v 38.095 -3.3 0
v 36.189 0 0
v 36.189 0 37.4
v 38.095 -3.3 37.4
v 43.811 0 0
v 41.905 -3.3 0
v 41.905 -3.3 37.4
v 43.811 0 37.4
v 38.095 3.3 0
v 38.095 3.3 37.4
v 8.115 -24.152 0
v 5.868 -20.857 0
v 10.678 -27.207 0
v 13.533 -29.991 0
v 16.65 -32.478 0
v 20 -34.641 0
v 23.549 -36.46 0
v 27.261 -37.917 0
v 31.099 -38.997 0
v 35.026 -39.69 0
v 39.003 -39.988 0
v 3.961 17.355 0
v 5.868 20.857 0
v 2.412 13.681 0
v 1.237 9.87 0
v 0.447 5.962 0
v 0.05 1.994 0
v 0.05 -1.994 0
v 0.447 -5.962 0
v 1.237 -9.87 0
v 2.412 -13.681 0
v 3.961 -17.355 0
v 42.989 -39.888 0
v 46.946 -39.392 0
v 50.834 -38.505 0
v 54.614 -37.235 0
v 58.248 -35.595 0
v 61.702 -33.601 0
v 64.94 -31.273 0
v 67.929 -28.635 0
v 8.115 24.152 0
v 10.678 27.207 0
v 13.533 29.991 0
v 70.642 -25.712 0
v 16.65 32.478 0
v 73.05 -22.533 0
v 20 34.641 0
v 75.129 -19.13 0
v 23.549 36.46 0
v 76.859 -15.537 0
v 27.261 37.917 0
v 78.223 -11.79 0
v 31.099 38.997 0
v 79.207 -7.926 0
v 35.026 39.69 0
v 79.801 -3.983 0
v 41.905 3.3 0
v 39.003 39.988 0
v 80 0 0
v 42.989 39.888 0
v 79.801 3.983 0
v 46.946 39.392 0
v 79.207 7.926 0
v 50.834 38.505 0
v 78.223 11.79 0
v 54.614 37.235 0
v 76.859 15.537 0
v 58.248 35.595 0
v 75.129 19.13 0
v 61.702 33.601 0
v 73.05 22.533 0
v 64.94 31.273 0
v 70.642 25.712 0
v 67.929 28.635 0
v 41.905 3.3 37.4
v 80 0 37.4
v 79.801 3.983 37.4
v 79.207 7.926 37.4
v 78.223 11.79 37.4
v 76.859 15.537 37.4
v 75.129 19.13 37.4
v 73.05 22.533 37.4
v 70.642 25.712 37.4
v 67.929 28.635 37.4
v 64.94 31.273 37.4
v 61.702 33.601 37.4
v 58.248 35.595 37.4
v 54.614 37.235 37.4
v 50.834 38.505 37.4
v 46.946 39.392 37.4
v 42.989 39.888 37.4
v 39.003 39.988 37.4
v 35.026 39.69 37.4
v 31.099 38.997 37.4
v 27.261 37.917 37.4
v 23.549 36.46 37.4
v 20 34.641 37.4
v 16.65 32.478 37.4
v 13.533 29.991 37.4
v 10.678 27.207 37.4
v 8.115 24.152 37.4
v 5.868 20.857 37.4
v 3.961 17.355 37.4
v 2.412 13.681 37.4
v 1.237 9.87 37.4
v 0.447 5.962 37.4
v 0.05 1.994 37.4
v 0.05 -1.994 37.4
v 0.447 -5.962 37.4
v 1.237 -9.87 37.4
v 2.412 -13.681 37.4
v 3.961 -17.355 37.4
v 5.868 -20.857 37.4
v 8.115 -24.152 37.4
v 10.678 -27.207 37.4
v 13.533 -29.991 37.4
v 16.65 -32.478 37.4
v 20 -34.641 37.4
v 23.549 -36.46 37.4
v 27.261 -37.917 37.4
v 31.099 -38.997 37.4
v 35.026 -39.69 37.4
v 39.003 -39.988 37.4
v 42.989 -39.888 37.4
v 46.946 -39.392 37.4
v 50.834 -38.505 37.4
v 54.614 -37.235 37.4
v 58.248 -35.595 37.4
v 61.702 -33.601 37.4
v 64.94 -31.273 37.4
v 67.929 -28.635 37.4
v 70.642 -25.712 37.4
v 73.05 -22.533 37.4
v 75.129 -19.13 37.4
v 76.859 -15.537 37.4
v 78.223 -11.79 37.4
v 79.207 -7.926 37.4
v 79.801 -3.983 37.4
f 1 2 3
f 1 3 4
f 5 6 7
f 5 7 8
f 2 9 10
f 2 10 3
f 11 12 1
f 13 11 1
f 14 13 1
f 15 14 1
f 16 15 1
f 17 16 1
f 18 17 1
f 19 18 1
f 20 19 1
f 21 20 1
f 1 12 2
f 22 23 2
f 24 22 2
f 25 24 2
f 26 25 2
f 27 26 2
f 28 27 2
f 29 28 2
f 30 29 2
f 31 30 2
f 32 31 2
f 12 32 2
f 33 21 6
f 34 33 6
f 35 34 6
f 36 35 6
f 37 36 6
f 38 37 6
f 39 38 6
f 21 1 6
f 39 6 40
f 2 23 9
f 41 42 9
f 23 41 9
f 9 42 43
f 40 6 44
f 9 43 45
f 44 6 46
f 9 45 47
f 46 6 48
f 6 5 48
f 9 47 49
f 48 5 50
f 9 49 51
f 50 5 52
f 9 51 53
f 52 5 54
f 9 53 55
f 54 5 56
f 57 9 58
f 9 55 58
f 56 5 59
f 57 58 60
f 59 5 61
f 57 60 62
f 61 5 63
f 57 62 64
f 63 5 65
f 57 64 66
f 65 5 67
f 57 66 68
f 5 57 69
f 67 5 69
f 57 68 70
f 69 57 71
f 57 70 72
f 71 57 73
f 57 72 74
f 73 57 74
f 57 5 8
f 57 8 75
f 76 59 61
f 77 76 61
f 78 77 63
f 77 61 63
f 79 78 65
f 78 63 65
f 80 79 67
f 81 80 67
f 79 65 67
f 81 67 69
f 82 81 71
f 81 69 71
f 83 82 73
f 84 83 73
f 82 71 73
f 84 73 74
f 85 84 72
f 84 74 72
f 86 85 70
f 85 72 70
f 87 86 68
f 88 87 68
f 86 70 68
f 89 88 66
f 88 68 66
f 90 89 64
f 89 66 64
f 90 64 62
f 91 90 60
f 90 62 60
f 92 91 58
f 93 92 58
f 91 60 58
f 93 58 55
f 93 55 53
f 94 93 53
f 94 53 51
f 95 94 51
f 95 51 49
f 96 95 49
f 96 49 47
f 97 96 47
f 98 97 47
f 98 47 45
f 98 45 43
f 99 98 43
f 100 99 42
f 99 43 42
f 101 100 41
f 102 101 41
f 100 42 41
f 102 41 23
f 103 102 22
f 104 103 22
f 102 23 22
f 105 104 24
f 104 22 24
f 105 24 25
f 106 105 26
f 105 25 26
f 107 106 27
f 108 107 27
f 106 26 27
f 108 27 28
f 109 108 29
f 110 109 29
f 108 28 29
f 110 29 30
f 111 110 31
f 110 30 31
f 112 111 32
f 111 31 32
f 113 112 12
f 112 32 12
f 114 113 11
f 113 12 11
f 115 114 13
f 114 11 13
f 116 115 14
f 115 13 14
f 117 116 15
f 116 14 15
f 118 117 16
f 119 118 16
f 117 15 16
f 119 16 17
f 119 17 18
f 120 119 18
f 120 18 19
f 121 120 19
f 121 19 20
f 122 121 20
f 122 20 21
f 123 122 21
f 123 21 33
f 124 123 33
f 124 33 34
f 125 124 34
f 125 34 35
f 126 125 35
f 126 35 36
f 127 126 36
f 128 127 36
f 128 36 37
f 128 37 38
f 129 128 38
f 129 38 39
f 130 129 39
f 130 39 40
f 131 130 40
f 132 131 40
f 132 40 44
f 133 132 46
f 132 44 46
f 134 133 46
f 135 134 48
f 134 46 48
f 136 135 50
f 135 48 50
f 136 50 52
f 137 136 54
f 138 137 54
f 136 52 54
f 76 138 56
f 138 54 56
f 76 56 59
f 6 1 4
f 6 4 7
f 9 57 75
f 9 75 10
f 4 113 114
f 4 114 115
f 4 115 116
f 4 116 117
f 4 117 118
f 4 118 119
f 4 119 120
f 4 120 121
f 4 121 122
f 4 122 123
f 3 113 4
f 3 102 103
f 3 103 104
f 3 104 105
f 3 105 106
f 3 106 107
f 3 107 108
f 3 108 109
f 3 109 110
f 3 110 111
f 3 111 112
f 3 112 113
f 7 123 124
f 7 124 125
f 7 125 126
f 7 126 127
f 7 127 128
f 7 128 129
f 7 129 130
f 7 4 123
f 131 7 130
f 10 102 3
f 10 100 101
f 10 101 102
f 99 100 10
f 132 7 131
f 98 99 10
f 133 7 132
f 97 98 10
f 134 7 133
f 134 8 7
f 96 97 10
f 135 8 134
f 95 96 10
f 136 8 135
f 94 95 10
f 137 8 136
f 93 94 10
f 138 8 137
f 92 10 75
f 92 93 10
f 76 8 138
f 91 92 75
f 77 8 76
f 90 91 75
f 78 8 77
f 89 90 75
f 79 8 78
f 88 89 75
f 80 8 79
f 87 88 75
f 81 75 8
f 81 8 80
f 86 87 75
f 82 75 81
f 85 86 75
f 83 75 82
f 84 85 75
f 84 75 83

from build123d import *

# Parameters (mm, degrees)
SKETCH_R     = 40
PAD_DEPTH    = 37.4
POCKET_DEPTH = 37.401


with BuildPart() as part:
    # Sketch → Pad (new body)
    with BuildSketch(Plane.XY):
        with Locations((40, 0)):
            Circle(SKETCH_R)
    extrude(amount=PAD_DEPTH)

    # Sketch001 → Pocket (cut, through all)
    with BuildSketch(Plane.XY):
        Polygon((43.810512, 0), (41.905256, 3.3), (38.094744, 3.3), (36.189488, 0), (38.094744, -3.3), (41.905256, -3.3), align=None)
    extrude(amount=POCKET_DEPTH, mode=Mode.SUBTRACT)


solid = part.part
